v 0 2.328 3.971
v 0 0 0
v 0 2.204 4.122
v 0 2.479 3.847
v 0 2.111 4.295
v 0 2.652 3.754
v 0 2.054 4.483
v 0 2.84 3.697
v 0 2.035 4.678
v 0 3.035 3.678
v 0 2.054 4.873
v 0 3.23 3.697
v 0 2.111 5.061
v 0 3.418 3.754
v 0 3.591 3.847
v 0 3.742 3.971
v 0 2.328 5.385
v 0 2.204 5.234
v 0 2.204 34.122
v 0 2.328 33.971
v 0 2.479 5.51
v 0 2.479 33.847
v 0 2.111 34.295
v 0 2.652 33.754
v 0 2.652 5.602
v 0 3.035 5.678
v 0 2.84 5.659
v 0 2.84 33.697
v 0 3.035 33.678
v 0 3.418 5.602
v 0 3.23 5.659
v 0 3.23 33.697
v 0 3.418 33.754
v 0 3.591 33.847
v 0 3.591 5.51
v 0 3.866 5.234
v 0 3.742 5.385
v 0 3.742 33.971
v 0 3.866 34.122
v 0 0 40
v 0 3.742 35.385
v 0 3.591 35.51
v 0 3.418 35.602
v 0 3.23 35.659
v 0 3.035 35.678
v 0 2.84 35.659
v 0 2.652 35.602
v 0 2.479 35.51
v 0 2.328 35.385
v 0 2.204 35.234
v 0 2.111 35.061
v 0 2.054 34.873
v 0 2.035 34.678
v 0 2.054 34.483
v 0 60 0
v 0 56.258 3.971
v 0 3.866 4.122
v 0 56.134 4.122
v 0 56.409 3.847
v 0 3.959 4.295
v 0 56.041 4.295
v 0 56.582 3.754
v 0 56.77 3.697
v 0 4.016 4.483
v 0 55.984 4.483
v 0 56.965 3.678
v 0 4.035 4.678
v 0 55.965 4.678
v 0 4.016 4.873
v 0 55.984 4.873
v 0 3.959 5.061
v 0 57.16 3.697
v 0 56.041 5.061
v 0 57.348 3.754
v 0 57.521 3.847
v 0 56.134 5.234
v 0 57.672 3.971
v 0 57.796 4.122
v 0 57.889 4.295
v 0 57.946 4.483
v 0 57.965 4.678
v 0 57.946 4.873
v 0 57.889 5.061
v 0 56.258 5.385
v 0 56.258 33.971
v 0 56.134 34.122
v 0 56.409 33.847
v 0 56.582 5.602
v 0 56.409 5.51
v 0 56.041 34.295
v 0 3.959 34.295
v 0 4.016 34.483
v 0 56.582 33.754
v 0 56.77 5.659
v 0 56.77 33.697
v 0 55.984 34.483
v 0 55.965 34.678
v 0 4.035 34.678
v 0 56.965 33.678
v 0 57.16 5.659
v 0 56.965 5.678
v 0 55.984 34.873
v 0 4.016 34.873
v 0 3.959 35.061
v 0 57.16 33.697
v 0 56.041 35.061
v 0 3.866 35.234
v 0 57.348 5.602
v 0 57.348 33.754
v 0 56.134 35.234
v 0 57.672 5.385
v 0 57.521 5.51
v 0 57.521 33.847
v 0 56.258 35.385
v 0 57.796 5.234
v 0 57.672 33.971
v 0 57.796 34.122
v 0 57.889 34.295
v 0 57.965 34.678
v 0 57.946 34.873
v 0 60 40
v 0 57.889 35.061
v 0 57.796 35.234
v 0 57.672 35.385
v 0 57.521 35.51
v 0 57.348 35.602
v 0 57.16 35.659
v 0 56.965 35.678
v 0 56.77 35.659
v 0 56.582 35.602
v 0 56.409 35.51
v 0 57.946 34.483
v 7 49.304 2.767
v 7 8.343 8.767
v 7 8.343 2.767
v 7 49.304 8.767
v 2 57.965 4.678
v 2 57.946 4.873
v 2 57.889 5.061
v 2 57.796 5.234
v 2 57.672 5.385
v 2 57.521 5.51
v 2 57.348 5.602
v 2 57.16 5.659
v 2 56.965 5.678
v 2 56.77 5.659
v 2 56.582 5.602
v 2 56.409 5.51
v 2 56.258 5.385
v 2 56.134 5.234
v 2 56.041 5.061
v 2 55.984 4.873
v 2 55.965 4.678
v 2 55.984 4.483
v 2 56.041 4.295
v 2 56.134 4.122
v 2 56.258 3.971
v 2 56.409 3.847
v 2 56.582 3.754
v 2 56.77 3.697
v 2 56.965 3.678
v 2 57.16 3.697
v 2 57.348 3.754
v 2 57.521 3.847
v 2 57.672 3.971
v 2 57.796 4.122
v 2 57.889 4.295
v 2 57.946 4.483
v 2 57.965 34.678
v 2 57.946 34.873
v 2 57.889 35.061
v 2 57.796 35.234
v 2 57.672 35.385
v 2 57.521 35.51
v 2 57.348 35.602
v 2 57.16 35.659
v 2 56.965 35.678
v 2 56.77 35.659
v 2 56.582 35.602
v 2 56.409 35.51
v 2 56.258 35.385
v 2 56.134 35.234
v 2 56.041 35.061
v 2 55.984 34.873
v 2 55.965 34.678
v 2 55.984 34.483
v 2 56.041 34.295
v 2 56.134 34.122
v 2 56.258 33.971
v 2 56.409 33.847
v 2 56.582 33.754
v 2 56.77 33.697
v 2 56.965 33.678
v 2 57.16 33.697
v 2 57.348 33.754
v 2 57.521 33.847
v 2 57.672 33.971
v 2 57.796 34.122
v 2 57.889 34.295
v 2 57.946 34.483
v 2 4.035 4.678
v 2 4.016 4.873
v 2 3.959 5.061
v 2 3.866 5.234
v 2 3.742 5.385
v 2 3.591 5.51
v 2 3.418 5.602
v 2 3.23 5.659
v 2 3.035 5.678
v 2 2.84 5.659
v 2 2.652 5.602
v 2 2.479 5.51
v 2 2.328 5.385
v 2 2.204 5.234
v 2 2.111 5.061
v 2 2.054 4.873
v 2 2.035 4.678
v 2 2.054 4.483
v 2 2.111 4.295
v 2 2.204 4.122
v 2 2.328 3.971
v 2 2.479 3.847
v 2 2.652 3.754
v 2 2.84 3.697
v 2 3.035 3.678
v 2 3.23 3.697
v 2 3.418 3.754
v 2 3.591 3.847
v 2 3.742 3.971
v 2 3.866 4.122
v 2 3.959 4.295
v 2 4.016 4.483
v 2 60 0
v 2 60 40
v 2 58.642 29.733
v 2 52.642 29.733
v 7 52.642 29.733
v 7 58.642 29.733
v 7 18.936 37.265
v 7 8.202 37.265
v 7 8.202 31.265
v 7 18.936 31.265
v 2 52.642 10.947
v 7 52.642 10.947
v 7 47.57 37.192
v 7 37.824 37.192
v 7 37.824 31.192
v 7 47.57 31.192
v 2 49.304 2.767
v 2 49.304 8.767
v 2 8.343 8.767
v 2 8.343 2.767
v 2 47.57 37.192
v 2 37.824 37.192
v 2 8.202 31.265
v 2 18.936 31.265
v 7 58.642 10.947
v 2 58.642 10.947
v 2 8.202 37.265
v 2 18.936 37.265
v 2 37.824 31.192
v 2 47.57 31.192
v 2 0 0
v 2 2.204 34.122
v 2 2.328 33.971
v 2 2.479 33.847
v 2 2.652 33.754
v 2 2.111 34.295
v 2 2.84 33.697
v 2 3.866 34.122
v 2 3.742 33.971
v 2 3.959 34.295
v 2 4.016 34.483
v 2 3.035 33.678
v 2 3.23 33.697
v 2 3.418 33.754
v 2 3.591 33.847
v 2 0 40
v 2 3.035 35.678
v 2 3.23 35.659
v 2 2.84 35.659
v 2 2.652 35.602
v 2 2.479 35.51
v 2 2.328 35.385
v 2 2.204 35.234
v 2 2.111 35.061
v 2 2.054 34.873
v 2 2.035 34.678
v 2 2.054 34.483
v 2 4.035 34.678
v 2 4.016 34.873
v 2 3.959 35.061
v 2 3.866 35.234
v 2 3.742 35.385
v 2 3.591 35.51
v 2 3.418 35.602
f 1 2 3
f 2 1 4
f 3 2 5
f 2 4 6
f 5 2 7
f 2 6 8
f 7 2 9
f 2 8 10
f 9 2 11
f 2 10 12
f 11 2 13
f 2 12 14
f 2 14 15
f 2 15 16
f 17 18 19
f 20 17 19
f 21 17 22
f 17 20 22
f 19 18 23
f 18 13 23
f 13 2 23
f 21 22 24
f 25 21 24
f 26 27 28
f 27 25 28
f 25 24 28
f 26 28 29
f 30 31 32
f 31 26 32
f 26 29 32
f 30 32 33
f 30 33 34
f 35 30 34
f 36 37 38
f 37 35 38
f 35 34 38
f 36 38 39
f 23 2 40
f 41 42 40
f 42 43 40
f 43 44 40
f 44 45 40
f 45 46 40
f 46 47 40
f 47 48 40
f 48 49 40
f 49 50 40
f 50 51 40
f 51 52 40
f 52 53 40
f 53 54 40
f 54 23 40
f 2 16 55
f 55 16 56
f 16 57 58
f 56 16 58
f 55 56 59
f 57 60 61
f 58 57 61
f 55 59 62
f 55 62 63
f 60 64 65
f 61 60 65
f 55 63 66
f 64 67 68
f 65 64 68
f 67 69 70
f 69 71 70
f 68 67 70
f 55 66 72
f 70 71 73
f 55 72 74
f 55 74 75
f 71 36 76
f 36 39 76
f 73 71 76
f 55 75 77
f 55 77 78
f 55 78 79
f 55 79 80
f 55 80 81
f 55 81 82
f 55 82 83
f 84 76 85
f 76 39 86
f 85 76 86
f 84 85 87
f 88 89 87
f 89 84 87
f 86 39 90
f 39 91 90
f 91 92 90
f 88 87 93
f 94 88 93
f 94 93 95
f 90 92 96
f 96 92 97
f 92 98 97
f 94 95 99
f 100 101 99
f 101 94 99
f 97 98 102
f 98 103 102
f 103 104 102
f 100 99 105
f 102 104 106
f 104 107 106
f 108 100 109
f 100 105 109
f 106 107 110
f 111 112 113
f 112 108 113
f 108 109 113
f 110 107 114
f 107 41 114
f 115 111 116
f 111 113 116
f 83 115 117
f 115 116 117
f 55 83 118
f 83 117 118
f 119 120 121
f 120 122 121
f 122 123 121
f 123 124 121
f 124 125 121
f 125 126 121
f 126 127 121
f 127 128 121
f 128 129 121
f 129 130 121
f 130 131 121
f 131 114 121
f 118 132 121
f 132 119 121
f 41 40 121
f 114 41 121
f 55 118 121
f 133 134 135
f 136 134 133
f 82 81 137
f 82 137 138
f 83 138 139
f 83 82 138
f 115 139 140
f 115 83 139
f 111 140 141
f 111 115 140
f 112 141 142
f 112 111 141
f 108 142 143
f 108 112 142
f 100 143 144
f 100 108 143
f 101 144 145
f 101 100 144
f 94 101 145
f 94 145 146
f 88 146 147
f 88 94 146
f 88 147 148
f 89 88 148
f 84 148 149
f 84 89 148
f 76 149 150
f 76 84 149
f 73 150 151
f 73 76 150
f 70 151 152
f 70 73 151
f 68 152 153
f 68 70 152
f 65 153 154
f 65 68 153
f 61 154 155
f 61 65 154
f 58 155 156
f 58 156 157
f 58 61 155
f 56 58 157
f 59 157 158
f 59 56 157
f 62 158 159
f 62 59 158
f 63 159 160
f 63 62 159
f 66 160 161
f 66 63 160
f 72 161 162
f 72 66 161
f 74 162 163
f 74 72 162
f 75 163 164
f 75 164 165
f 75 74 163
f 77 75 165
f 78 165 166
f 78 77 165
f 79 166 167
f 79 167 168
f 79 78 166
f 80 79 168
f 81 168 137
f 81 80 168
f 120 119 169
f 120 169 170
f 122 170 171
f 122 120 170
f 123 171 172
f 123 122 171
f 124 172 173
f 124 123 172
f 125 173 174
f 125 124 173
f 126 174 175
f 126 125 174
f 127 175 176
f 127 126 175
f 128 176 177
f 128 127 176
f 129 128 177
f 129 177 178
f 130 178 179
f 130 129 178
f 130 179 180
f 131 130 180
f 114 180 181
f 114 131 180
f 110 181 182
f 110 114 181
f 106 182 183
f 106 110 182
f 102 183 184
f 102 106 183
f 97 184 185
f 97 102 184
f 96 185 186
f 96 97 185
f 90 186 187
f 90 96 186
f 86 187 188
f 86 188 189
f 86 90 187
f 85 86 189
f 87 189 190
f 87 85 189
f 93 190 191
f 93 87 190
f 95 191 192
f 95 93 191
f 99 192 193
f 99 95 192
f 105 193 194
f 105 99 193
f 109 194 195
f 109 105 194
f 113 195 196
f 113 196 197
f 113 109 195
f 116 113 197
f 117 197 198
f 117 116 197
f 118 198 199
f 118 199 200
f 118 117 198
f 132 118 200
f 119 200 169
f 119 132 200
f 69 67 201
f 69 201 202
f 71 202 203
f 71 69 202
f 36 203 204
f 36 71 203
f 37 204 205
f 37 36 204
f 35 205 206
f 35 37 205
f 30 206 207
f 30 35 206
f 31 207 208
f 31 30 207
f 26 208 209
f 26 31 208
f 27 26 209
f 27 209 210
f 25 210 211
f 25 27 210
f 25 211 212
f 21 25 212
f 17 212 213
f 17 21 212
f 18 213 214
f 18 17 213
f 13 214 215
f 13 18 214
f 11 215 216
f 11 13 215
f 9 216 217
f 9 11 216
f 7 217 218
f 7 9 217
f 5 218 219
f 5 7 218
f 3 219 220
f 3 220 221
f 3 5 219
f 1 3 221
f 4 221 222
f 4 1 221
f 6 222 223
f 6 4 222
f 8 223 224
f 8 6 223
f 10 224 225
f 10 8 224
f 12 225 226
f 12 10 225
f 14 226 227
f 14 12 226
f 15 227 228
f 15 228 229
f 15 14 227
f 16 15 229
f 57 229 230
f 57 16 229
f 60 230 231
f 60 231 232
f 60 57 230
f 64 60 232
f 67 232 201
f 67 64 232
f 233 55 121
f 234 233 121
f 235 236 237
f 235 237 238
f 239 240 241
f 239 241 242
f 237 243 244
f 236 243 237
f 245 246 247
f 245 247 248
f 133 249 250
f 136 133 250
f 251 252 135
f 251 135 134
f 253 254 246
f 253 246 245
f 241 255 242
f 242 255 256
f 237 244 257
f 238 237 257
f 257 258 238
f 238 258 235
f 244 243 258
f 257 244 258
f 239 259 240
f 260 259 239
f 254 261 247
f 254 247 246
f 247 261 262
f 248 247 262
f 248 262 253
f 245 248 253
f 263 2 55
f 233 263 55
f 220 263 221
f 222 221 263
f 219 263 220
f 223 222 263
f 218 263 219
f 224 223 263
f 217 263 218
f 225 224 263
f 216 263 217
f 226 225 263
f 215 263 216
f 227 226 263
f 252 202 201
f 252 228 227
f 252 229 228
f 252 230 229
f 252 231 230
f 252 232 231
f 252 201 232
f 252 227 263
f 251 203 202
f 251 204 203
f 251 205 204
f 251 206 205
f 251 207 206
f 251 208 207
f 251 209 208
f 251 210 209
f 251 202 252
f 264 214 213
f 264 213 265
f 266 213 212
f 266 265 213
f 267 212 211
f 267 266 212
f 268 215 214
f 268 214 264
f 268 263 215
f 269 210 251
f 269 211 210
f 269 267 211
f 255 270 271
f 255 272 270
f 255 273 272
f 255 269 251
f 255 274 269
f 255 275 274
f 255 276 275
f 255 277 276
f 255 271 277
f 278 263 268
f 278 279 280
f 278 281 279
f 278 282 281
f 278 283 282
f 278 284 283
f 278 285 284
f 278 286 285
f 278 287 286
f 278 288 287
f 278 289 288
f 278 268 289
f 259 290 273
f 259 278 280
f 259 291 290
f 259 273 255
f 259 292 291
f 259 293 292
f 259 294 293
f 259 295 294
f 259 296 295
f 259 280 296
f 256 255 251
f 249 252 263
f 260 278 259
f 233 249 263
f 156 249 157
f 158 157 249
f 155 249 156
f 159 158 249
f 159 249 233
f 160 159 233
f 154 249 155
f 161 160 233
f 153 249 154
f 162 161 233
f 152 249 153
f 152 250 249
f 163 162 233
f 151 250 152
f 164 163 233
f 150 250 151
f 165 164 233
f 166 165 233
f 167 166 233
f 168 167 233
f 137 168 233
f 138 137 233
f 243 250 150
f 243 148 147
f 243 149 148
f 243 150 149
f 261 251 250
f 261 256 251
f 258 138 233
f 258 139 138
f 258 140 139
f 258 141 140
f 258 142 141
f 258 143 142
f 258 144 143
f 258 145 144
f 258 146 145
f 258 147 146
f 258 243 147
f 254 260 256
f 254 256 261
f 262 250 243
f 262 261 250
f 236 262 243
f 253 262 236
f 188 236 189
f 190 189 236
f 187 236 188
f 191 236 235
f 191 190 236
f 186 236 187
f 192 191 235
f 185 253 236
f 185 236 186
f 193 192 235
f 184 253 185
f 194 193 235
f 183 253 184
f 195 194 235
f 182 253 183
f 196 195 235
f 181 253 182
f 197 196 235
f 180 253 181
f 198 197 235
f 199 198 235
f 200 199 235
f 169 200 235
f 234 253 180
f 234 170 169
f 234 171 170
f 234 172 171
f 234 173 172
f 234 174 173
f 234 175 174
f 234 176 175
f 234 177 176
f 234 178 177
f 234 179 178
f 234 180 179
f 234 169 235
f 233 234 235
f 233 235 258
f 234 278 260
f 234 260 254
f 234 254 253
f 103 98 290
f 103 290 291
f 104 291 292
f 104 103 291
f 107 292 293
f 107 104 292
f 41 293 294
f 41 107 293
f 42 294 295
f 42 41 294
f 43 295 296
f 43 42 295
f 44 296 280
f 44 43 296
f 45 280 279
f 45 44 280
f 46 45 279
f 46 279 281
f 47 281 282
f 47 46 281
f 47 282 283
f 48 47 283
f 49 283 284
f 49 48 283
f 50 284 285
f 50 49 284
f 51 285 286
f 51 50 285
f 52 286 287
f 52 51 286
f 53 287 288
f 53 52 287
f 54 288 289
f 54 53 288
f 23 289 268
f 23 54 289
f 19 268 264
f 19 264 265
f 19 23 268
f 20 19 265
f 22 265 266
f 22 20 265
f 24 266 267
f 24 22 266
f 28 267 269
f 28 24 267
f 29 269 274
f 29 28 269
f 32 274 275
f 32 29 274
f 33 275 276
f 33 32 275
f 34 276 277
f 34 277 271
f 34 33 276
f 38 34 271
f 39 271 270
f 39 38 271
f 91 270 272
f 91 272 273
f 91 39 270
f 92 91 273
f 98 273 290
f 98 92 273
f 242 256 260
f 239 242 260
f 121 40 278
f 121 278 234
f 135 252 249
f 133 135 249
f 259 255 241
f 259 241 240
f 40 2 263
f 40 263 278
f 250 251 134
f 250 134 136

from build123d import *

# Parameters (mm, degrees)
SKETCH_W      = 60
SKETCH_H      = 40
SKETCH_R      = 1
PAD_DEPTH     = 2
SKETCH001_W   = 10.734469
SKETCH001_H   = 6
SKETCH001_W_2 = 6
SKETCH001_H_2 = 18.785311
SKETCH001_W_3 = 40.960449
SKETCH001_W_4 = 9.745754
PAD001_DEPTH  = 5


with BuildPart() as part:
    # Sketch → Pad (new body)
    with BuildSketch(Plane.YZ):
        with Locations((30, 20)):
            Rectangle(SKETCH_W, SKETCH_H)
        with Locations((3.035, 34.678047)):
            Circle(SKETCH_R, mode=Mode.SUBTRACT)
        with Locations((56.965, 34.678047)):
            Circle(SKETCH_R, mode=Mode.SUBTRACT)
        with Locations((56.965, 4.678047)):
            Circle(SKETCH_R, mode=Mode.SUBTRACT)
        with Locations((3.035, 4.678047)):
            Circle(SKETCH_R, mode=Mode.SUBTRACT)
    extrude(amount=PAD_DEPTH)

    # Sketch001 (on Face10 of Pad) → Pad001 (join)
    with BuildSketch(Plane.YZ.offset(2)):
        with Locations((13.569118, 34.265322)):
            Rectangle(SKETCH001_W, SKETCH001_H)
        with Locations((55.642065, 20.339975)):
            Rectangle(SKETCH001_W_2, SKETCH001_H_2)
        with Locations((28.823356, 5.767194)):
            Rectangle(SKETCH001_W_3, SKETCH001_H)
        with Locations((42.696971, 34.192021)):
            Rectangle(SKETCH001_W_4, SKETCH001_H)
    extrude(amount=PAD001_DEPTH)


solid = part.part
